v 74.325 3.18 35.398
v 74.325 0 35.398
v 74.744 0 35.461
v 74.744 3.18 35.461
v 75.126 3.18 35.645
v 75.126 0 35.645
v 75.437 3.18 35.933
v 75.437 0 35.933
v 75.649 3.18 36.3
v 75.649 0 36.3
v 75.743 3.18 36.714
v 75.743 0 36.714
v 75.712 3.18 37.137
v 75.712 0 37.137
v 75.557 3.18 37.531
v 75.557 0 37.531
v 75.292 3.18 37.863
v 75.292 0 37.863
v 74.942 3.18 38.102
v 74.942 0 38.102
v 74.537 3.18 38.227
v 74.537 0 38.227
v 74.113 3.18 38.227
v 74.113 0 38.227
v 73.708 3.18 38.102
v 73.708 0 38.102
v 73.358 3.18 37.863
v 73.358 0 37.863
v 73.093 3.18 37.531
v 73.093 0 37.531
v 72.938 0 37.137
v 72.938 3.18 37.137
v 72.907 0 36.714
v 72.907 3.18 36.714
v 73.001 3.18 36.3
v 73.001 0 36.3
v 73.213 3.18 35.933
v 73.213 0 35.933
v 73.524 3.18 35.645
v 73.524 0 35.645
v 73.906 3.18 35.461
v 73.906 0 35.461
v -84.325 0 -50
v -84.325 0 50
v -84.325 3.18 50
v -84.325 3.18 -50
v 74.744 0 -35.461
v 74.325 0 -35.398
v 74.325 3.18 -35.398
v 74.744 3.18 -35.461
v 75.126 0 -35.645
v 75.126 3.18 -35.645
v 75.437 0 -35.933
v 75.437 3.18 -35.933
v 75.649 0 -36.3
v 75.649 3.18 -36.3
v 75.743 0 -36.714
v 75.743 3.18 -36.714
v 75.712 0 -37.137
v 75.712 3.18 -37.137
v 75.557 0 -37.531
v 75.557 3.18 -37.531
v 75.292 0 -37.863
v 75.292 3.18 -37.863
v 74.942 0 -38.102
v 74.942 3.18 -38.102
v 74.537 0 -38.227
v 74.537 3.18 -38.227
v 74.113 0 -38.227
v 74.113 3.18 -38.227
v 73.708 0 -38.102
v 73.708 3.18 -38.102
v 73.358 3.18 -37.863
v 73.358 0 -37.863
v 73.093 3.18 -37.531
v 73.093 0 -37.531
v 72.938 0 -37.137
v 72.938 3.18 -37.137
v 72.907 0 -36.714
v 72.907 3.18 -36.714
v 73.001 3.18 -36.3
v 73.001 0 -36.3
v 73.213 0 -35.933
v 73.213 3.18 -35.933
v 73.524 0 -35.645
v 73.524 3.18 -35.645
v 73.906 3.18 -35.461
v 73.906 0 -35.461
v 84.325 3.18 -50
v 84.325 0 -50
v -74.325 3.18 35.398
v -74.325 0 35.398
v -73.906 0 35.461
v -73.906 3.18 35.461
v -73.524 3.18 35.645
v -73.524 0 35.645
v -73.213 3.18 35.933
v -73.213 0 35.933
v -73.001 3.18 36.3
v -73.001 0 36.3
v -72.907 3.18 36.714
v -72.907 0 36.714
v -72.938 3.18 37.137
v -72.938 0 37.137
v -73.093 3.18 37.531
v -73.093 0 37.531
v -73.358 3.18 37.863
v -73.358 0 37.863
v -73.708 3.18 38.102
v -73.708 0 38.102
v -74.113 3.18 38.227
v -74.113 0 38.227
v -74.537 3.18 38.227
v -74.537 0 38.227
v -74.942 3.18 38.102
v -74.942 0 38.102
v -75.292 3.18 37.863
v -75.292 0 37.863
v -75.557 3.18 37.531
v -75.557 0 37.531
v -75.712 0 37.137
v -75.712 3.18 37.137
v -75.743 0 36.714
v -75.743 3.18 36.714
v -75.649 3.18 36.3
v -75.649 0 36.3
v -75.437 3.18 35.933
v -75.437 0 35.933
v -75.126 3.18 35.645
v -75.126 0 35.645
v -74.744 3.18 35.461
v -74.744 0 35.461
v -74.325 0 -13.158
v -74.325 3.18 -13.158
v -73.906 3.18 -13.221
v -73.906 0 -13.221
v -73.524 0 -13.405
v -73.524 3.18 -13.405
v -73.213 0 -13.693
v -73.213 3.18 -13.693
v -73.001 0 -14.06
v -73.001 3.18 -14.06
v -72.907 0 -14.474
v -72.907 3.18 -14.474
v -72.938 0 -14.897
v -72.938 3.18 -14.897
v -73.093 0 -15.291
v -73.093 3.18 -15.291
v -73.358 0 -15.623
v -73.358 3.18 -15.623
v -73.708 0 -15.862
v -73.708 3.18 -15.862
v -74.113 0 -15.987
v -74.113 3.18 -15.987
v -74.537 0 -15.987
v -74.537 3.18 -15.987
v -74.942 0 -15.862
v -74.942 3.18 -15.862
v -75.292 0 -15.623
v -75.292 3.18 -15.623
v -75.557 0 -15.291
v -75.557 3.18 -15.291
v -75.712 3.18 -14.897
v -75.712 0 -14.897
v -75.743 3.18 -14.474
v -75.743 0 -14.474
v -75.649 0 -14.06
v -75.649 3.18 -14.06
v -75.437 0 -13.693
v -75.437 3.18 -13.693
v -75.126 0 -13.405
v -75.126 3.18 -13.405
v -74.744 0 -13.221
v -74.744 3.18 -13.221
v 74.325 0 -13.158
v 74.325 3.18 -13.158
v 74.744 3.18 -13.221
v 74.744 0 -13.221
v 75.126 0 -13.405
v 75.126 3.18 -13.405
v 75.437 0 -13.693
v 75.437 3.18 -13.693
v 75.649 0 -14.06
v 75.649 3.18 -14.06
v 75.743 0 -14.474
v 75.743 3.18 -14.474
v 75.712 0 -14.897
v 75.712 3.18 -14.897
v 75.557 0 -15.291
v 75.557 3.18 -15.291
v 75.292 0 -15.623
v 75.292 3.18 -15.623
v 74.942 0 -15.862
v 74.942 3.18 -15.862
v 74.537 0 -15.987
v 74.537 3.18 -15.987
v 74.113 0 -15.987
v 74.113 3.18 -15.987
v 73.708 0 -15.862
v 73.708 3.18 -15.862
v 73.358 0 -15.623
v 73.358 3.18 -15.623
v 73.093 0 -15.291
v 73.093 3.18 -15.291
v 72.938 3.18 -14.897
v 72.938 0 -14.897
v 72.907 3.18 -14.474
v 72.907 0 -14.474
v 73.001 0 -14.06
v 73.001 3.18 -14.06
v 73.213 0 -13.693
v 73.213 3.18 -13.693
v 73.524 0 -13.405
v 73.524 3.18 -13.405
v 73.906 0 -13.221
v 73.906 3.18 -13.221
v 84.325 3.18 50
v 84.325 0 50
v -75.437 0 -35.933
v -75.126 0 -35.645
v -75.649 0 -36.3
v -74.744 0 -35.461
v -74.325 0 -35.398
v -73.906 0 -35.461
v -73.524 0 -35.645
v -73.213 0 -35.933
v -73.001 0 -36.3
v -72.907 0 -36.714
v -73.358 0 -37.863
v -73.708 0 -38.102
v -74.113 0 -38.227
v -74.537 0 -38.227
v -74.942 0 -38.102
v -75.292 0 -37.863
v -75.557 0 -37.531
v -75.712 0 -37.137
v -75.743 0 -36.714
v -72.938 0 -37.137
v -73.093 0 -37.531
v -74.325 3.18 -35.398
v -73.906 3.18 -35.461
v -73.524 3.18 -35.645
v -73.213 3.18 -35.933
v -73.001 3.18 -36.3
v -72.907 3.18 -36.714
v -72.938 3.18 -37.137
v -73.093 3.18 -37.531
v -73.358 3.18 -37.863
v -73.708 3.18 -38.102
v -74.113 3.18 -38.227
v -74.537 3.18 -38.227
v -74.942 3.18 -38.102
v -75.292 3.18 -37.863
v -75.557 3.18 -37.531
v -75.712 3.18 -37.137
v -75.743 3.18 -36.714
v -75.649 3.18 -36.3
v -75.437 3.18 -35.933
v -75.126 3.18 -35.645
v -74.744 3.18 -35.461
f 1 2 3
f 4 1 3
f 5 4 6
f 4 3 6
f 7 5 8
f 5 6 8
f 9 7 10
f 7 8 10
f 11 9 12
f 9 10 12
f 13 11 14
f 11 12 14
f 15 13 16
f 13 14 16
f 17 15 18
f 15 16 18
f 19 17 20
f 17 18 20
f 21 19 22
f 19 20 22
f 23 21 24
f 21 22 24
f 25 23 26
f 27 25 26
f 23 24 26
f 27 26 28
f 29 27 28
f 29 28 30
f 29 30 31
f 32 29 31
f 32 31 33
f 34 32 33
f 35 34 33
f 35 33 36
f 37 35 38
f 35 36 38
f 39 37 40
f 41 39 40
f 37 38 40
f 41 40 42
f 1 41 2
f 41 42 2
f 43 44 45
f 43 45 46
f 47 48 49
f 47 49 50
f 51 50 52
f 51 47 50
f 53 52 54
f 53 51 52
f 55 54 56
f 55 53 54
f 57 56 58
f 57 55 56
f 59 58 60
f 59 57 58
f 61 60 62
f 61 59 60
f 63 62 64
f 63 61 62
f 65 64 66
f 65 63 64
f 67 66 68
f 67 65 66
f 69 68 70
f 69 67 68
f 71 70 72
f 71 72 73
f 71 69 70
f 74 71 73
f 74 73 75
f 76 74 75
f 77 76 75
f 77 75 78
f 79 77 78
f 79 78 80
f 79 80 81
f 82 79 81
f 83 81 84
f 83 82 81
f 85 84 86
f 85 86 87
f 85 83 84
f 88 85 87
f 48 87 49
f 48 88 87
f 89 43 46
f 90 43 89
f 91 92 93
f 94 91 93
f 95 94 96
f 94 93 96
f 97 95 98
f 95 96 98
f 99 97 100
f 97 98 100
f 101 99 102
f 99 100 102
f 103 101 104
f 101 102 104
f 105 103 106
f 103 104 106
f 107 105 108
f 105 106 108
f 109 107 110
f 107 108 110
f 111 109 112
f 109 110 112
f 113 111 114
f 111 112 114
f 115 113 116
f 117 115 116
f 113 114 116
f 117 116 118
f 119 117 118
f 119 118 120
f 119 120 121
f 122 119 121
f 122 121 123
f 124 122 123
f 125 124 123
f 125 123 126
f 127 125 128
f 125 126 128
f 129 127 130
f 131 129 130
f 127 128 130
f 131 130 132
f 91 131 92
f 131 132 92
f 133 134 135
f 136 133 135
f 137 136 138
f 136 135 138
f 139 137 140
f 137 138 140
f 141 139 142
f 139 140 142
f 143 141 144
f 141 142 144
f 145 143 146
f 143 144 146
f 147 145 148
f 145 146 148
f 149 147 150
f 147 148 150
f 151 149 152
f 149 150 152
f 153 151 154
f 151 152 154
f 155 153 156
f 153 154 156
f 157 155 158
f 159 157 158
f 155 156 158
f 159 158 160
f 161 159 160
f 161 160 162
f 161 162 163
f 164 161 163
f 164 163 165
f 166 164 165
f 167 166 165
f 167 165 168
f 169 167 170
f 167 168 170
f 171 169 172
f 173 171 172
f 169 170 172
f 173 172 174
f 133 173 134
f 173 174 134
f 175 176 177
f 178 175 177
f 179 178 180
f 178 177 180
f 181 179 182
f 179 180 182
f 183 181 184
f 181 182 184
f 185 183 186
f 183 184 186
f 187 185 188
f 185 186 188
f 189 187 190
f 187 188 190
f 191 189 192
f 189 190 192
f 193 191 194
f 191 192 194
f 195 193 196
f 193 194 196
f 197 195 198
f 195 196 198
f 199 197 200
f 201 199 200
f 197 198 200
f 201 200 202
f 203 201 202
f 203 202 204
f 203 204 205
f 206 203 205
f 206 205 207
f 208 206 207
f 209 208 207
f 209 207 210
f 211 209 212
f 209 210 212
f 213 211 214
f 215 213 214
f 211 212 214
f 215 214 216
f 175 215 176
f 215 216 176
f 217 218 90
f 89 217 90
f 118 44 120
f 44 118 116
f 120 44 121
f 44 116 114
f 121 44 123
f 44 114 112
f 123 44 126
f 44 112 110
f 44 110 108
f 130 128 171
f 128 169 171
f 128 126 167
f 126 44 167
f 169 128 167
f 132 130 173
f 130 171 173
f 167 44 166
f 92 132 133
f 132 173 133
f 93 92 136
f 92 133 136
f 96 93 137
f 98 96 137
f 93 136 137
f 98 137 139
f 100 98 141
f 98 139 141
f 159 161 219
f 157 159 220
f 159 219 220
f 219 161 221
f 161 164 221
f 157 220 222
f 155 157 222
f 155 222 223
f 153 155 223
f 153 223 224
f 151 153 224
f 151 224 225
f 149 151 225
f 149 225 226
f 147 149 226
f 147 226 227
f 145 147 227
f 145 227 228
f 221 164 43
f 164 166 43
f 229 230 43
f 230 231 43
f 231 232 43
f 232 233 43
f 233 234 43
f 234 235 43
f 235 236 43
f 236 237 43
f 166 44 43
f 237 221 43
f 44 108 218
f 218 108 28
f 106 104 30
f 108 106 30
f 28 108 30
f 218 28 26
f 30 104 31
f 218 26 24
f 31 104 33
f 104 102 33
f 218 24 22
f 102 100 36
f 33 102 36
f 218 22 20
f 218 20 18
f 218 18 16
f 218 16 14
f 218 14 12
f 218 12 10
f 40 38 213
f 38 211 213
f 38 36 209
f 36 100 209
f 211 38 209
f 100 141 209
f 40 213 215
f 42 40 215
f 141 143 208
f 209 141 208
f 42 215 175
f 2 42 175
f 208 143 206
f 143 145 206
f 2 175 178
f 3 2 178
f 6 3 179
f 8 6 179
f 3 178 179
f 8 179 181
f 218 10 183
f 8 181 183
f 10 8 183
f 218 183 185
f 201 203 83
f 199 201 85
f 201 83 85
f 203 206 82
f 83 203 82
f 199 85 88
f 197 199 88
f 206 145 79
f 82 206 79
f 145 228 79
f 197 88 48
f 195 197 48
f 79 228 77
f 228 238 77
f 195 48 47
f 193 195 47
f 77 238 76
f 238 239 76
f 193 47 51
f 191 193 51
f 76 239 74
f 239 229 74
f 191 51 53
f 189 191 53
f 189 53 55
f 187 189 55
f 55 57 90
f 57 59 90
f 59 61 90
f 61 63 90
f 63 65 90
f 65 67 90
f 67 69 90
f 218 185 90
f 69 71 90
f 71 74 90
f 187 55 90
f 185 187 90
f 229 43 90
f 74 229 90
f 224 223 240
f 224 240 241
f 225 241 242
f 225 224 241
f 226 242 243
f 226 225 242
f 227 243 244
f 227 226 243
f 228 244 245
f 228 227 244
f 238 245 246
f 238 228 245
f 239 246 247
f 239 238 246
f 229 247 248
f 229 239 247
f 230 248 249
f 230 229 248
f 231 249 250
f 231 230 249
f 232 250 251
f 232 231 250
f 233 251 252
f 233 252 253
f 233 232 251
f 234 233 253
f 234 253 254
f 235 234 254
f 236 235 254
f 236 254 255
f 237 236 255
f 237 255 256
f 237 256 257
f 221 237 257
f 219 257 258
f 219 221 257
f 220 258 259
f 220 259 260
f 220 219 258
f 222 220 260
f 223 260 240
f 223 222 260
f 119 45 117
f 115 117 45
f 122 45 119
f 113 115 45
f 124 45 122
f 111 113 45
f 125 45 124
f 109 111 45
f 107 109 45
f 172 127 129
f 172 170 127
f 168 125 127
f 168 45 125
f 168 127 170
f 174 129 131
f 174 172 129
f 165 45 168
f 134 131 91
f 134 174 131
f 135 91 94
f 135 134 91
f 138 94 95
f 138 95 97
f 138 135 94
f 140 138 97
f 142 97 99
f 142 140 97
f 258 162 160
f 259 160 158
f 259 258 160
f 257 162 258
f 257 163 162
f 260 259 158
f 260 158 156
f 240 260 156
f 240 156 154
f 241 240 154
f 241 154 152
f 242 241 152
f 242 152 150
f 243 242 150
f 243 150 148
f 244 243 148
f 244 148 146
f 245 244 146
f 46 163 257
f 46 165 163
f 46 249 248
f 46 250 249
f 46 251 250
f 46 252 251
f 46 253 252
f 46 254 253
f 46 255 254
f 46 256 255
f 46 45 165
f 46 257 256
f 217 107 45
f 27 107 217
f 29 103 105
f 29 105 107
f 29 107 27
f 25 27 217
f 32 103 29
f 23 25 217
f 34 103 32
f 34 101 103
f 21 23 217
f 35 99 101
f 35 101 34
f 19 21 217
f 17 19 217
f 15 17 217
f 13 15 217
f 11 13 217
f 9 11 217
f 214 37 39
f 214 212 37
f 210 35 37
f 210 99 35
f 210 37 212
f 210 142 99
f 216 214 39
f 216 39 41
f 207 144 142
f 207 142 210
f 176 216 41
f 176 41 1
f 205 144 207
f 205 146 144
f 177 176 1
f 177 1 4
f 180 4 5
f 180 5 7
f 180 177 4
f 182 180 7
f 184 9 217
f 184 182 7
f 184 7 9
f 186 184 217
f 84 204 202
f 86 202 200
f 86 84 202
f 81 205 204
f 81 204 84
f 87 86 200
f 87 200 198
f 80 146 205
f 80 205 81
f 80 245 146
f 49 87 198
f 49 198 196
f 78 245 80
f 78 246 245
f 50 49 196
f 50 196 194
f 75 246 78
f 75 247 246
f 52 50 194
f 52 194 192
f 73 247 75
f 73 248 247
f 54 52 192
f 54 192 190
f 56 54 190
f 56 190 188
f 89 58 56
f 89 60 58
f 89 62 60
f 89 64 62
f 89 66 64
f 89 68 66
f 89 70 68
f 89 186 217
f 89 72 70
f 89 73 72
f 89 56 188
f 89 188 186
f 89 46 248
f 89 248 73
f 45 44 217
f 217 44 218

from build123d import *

# Parameters (mm, degrees)
SKETCH1_W           = 168.65
SKETCH1_H           = 100
BOSS_EXTRUDE1_DEPTH = 3.18
SKETCH2_R           = 1.4224
CUT_EXTRUDE1_DEPTH  = 3.18
SKETCH3_R           = 1.4224
CUT_EXTRUDE2_DEPTH  = 3.18


with BuildPart() as part:
    # Sketch1 → Boss-Extrude1 (new body)
    with BuildSketch(Plane(origin=(0, 0, 0), x_dir=(1, 0, 0), z_dir=(0, 1, 0))):
        Rectangle(SKETCH1_W, SKETCH1_H)
    extrude(amount=BOSS_EXTRUDE1_DEPTH)

    # Sketch2 → Cut-Extrude1 (cut)
    with BuildSketch(Plane.XZ):
        with Locations(Location((-74.325, 36.82, 0), (0, 0, 270))):
            Circle(SKETCH2_R)
        with Locations(Location((74.325, 36.82, 0), (0, 0, 270))):
            Circle(SKETCH2_R)
    cut_extrude1 = extrude(amount=-CUT_EXTRUDE1_DEPTH, mode=Mode.SUBTRACT)

    # Mirror1: Cut-Extrude1 across plane
    add(cut_extrude1.mirror(Plane.XY), mode=Mode.SUBTRACT)

    # Sketch3 → Cut-Extrude2 (cut)
    with BuildSketch(Plane(origin=(0, 3.18, 0), x_dir=(1, 0, 0), z_dir=(0, 1, 0))):
        with Locations(Location((-74.325, 14.58, 0), (0, 0, 270))):
            Circle(SKETCH3_R)
        with Locations(Location((74.325, 14.58, 0), (0, 0, 270))):
            Circle(SKETCH3_R)
    extrude(amount=-CUT_EXTRUDE2_DEPTH, mode=Mode.SUBTRACT)


solid = part.part
